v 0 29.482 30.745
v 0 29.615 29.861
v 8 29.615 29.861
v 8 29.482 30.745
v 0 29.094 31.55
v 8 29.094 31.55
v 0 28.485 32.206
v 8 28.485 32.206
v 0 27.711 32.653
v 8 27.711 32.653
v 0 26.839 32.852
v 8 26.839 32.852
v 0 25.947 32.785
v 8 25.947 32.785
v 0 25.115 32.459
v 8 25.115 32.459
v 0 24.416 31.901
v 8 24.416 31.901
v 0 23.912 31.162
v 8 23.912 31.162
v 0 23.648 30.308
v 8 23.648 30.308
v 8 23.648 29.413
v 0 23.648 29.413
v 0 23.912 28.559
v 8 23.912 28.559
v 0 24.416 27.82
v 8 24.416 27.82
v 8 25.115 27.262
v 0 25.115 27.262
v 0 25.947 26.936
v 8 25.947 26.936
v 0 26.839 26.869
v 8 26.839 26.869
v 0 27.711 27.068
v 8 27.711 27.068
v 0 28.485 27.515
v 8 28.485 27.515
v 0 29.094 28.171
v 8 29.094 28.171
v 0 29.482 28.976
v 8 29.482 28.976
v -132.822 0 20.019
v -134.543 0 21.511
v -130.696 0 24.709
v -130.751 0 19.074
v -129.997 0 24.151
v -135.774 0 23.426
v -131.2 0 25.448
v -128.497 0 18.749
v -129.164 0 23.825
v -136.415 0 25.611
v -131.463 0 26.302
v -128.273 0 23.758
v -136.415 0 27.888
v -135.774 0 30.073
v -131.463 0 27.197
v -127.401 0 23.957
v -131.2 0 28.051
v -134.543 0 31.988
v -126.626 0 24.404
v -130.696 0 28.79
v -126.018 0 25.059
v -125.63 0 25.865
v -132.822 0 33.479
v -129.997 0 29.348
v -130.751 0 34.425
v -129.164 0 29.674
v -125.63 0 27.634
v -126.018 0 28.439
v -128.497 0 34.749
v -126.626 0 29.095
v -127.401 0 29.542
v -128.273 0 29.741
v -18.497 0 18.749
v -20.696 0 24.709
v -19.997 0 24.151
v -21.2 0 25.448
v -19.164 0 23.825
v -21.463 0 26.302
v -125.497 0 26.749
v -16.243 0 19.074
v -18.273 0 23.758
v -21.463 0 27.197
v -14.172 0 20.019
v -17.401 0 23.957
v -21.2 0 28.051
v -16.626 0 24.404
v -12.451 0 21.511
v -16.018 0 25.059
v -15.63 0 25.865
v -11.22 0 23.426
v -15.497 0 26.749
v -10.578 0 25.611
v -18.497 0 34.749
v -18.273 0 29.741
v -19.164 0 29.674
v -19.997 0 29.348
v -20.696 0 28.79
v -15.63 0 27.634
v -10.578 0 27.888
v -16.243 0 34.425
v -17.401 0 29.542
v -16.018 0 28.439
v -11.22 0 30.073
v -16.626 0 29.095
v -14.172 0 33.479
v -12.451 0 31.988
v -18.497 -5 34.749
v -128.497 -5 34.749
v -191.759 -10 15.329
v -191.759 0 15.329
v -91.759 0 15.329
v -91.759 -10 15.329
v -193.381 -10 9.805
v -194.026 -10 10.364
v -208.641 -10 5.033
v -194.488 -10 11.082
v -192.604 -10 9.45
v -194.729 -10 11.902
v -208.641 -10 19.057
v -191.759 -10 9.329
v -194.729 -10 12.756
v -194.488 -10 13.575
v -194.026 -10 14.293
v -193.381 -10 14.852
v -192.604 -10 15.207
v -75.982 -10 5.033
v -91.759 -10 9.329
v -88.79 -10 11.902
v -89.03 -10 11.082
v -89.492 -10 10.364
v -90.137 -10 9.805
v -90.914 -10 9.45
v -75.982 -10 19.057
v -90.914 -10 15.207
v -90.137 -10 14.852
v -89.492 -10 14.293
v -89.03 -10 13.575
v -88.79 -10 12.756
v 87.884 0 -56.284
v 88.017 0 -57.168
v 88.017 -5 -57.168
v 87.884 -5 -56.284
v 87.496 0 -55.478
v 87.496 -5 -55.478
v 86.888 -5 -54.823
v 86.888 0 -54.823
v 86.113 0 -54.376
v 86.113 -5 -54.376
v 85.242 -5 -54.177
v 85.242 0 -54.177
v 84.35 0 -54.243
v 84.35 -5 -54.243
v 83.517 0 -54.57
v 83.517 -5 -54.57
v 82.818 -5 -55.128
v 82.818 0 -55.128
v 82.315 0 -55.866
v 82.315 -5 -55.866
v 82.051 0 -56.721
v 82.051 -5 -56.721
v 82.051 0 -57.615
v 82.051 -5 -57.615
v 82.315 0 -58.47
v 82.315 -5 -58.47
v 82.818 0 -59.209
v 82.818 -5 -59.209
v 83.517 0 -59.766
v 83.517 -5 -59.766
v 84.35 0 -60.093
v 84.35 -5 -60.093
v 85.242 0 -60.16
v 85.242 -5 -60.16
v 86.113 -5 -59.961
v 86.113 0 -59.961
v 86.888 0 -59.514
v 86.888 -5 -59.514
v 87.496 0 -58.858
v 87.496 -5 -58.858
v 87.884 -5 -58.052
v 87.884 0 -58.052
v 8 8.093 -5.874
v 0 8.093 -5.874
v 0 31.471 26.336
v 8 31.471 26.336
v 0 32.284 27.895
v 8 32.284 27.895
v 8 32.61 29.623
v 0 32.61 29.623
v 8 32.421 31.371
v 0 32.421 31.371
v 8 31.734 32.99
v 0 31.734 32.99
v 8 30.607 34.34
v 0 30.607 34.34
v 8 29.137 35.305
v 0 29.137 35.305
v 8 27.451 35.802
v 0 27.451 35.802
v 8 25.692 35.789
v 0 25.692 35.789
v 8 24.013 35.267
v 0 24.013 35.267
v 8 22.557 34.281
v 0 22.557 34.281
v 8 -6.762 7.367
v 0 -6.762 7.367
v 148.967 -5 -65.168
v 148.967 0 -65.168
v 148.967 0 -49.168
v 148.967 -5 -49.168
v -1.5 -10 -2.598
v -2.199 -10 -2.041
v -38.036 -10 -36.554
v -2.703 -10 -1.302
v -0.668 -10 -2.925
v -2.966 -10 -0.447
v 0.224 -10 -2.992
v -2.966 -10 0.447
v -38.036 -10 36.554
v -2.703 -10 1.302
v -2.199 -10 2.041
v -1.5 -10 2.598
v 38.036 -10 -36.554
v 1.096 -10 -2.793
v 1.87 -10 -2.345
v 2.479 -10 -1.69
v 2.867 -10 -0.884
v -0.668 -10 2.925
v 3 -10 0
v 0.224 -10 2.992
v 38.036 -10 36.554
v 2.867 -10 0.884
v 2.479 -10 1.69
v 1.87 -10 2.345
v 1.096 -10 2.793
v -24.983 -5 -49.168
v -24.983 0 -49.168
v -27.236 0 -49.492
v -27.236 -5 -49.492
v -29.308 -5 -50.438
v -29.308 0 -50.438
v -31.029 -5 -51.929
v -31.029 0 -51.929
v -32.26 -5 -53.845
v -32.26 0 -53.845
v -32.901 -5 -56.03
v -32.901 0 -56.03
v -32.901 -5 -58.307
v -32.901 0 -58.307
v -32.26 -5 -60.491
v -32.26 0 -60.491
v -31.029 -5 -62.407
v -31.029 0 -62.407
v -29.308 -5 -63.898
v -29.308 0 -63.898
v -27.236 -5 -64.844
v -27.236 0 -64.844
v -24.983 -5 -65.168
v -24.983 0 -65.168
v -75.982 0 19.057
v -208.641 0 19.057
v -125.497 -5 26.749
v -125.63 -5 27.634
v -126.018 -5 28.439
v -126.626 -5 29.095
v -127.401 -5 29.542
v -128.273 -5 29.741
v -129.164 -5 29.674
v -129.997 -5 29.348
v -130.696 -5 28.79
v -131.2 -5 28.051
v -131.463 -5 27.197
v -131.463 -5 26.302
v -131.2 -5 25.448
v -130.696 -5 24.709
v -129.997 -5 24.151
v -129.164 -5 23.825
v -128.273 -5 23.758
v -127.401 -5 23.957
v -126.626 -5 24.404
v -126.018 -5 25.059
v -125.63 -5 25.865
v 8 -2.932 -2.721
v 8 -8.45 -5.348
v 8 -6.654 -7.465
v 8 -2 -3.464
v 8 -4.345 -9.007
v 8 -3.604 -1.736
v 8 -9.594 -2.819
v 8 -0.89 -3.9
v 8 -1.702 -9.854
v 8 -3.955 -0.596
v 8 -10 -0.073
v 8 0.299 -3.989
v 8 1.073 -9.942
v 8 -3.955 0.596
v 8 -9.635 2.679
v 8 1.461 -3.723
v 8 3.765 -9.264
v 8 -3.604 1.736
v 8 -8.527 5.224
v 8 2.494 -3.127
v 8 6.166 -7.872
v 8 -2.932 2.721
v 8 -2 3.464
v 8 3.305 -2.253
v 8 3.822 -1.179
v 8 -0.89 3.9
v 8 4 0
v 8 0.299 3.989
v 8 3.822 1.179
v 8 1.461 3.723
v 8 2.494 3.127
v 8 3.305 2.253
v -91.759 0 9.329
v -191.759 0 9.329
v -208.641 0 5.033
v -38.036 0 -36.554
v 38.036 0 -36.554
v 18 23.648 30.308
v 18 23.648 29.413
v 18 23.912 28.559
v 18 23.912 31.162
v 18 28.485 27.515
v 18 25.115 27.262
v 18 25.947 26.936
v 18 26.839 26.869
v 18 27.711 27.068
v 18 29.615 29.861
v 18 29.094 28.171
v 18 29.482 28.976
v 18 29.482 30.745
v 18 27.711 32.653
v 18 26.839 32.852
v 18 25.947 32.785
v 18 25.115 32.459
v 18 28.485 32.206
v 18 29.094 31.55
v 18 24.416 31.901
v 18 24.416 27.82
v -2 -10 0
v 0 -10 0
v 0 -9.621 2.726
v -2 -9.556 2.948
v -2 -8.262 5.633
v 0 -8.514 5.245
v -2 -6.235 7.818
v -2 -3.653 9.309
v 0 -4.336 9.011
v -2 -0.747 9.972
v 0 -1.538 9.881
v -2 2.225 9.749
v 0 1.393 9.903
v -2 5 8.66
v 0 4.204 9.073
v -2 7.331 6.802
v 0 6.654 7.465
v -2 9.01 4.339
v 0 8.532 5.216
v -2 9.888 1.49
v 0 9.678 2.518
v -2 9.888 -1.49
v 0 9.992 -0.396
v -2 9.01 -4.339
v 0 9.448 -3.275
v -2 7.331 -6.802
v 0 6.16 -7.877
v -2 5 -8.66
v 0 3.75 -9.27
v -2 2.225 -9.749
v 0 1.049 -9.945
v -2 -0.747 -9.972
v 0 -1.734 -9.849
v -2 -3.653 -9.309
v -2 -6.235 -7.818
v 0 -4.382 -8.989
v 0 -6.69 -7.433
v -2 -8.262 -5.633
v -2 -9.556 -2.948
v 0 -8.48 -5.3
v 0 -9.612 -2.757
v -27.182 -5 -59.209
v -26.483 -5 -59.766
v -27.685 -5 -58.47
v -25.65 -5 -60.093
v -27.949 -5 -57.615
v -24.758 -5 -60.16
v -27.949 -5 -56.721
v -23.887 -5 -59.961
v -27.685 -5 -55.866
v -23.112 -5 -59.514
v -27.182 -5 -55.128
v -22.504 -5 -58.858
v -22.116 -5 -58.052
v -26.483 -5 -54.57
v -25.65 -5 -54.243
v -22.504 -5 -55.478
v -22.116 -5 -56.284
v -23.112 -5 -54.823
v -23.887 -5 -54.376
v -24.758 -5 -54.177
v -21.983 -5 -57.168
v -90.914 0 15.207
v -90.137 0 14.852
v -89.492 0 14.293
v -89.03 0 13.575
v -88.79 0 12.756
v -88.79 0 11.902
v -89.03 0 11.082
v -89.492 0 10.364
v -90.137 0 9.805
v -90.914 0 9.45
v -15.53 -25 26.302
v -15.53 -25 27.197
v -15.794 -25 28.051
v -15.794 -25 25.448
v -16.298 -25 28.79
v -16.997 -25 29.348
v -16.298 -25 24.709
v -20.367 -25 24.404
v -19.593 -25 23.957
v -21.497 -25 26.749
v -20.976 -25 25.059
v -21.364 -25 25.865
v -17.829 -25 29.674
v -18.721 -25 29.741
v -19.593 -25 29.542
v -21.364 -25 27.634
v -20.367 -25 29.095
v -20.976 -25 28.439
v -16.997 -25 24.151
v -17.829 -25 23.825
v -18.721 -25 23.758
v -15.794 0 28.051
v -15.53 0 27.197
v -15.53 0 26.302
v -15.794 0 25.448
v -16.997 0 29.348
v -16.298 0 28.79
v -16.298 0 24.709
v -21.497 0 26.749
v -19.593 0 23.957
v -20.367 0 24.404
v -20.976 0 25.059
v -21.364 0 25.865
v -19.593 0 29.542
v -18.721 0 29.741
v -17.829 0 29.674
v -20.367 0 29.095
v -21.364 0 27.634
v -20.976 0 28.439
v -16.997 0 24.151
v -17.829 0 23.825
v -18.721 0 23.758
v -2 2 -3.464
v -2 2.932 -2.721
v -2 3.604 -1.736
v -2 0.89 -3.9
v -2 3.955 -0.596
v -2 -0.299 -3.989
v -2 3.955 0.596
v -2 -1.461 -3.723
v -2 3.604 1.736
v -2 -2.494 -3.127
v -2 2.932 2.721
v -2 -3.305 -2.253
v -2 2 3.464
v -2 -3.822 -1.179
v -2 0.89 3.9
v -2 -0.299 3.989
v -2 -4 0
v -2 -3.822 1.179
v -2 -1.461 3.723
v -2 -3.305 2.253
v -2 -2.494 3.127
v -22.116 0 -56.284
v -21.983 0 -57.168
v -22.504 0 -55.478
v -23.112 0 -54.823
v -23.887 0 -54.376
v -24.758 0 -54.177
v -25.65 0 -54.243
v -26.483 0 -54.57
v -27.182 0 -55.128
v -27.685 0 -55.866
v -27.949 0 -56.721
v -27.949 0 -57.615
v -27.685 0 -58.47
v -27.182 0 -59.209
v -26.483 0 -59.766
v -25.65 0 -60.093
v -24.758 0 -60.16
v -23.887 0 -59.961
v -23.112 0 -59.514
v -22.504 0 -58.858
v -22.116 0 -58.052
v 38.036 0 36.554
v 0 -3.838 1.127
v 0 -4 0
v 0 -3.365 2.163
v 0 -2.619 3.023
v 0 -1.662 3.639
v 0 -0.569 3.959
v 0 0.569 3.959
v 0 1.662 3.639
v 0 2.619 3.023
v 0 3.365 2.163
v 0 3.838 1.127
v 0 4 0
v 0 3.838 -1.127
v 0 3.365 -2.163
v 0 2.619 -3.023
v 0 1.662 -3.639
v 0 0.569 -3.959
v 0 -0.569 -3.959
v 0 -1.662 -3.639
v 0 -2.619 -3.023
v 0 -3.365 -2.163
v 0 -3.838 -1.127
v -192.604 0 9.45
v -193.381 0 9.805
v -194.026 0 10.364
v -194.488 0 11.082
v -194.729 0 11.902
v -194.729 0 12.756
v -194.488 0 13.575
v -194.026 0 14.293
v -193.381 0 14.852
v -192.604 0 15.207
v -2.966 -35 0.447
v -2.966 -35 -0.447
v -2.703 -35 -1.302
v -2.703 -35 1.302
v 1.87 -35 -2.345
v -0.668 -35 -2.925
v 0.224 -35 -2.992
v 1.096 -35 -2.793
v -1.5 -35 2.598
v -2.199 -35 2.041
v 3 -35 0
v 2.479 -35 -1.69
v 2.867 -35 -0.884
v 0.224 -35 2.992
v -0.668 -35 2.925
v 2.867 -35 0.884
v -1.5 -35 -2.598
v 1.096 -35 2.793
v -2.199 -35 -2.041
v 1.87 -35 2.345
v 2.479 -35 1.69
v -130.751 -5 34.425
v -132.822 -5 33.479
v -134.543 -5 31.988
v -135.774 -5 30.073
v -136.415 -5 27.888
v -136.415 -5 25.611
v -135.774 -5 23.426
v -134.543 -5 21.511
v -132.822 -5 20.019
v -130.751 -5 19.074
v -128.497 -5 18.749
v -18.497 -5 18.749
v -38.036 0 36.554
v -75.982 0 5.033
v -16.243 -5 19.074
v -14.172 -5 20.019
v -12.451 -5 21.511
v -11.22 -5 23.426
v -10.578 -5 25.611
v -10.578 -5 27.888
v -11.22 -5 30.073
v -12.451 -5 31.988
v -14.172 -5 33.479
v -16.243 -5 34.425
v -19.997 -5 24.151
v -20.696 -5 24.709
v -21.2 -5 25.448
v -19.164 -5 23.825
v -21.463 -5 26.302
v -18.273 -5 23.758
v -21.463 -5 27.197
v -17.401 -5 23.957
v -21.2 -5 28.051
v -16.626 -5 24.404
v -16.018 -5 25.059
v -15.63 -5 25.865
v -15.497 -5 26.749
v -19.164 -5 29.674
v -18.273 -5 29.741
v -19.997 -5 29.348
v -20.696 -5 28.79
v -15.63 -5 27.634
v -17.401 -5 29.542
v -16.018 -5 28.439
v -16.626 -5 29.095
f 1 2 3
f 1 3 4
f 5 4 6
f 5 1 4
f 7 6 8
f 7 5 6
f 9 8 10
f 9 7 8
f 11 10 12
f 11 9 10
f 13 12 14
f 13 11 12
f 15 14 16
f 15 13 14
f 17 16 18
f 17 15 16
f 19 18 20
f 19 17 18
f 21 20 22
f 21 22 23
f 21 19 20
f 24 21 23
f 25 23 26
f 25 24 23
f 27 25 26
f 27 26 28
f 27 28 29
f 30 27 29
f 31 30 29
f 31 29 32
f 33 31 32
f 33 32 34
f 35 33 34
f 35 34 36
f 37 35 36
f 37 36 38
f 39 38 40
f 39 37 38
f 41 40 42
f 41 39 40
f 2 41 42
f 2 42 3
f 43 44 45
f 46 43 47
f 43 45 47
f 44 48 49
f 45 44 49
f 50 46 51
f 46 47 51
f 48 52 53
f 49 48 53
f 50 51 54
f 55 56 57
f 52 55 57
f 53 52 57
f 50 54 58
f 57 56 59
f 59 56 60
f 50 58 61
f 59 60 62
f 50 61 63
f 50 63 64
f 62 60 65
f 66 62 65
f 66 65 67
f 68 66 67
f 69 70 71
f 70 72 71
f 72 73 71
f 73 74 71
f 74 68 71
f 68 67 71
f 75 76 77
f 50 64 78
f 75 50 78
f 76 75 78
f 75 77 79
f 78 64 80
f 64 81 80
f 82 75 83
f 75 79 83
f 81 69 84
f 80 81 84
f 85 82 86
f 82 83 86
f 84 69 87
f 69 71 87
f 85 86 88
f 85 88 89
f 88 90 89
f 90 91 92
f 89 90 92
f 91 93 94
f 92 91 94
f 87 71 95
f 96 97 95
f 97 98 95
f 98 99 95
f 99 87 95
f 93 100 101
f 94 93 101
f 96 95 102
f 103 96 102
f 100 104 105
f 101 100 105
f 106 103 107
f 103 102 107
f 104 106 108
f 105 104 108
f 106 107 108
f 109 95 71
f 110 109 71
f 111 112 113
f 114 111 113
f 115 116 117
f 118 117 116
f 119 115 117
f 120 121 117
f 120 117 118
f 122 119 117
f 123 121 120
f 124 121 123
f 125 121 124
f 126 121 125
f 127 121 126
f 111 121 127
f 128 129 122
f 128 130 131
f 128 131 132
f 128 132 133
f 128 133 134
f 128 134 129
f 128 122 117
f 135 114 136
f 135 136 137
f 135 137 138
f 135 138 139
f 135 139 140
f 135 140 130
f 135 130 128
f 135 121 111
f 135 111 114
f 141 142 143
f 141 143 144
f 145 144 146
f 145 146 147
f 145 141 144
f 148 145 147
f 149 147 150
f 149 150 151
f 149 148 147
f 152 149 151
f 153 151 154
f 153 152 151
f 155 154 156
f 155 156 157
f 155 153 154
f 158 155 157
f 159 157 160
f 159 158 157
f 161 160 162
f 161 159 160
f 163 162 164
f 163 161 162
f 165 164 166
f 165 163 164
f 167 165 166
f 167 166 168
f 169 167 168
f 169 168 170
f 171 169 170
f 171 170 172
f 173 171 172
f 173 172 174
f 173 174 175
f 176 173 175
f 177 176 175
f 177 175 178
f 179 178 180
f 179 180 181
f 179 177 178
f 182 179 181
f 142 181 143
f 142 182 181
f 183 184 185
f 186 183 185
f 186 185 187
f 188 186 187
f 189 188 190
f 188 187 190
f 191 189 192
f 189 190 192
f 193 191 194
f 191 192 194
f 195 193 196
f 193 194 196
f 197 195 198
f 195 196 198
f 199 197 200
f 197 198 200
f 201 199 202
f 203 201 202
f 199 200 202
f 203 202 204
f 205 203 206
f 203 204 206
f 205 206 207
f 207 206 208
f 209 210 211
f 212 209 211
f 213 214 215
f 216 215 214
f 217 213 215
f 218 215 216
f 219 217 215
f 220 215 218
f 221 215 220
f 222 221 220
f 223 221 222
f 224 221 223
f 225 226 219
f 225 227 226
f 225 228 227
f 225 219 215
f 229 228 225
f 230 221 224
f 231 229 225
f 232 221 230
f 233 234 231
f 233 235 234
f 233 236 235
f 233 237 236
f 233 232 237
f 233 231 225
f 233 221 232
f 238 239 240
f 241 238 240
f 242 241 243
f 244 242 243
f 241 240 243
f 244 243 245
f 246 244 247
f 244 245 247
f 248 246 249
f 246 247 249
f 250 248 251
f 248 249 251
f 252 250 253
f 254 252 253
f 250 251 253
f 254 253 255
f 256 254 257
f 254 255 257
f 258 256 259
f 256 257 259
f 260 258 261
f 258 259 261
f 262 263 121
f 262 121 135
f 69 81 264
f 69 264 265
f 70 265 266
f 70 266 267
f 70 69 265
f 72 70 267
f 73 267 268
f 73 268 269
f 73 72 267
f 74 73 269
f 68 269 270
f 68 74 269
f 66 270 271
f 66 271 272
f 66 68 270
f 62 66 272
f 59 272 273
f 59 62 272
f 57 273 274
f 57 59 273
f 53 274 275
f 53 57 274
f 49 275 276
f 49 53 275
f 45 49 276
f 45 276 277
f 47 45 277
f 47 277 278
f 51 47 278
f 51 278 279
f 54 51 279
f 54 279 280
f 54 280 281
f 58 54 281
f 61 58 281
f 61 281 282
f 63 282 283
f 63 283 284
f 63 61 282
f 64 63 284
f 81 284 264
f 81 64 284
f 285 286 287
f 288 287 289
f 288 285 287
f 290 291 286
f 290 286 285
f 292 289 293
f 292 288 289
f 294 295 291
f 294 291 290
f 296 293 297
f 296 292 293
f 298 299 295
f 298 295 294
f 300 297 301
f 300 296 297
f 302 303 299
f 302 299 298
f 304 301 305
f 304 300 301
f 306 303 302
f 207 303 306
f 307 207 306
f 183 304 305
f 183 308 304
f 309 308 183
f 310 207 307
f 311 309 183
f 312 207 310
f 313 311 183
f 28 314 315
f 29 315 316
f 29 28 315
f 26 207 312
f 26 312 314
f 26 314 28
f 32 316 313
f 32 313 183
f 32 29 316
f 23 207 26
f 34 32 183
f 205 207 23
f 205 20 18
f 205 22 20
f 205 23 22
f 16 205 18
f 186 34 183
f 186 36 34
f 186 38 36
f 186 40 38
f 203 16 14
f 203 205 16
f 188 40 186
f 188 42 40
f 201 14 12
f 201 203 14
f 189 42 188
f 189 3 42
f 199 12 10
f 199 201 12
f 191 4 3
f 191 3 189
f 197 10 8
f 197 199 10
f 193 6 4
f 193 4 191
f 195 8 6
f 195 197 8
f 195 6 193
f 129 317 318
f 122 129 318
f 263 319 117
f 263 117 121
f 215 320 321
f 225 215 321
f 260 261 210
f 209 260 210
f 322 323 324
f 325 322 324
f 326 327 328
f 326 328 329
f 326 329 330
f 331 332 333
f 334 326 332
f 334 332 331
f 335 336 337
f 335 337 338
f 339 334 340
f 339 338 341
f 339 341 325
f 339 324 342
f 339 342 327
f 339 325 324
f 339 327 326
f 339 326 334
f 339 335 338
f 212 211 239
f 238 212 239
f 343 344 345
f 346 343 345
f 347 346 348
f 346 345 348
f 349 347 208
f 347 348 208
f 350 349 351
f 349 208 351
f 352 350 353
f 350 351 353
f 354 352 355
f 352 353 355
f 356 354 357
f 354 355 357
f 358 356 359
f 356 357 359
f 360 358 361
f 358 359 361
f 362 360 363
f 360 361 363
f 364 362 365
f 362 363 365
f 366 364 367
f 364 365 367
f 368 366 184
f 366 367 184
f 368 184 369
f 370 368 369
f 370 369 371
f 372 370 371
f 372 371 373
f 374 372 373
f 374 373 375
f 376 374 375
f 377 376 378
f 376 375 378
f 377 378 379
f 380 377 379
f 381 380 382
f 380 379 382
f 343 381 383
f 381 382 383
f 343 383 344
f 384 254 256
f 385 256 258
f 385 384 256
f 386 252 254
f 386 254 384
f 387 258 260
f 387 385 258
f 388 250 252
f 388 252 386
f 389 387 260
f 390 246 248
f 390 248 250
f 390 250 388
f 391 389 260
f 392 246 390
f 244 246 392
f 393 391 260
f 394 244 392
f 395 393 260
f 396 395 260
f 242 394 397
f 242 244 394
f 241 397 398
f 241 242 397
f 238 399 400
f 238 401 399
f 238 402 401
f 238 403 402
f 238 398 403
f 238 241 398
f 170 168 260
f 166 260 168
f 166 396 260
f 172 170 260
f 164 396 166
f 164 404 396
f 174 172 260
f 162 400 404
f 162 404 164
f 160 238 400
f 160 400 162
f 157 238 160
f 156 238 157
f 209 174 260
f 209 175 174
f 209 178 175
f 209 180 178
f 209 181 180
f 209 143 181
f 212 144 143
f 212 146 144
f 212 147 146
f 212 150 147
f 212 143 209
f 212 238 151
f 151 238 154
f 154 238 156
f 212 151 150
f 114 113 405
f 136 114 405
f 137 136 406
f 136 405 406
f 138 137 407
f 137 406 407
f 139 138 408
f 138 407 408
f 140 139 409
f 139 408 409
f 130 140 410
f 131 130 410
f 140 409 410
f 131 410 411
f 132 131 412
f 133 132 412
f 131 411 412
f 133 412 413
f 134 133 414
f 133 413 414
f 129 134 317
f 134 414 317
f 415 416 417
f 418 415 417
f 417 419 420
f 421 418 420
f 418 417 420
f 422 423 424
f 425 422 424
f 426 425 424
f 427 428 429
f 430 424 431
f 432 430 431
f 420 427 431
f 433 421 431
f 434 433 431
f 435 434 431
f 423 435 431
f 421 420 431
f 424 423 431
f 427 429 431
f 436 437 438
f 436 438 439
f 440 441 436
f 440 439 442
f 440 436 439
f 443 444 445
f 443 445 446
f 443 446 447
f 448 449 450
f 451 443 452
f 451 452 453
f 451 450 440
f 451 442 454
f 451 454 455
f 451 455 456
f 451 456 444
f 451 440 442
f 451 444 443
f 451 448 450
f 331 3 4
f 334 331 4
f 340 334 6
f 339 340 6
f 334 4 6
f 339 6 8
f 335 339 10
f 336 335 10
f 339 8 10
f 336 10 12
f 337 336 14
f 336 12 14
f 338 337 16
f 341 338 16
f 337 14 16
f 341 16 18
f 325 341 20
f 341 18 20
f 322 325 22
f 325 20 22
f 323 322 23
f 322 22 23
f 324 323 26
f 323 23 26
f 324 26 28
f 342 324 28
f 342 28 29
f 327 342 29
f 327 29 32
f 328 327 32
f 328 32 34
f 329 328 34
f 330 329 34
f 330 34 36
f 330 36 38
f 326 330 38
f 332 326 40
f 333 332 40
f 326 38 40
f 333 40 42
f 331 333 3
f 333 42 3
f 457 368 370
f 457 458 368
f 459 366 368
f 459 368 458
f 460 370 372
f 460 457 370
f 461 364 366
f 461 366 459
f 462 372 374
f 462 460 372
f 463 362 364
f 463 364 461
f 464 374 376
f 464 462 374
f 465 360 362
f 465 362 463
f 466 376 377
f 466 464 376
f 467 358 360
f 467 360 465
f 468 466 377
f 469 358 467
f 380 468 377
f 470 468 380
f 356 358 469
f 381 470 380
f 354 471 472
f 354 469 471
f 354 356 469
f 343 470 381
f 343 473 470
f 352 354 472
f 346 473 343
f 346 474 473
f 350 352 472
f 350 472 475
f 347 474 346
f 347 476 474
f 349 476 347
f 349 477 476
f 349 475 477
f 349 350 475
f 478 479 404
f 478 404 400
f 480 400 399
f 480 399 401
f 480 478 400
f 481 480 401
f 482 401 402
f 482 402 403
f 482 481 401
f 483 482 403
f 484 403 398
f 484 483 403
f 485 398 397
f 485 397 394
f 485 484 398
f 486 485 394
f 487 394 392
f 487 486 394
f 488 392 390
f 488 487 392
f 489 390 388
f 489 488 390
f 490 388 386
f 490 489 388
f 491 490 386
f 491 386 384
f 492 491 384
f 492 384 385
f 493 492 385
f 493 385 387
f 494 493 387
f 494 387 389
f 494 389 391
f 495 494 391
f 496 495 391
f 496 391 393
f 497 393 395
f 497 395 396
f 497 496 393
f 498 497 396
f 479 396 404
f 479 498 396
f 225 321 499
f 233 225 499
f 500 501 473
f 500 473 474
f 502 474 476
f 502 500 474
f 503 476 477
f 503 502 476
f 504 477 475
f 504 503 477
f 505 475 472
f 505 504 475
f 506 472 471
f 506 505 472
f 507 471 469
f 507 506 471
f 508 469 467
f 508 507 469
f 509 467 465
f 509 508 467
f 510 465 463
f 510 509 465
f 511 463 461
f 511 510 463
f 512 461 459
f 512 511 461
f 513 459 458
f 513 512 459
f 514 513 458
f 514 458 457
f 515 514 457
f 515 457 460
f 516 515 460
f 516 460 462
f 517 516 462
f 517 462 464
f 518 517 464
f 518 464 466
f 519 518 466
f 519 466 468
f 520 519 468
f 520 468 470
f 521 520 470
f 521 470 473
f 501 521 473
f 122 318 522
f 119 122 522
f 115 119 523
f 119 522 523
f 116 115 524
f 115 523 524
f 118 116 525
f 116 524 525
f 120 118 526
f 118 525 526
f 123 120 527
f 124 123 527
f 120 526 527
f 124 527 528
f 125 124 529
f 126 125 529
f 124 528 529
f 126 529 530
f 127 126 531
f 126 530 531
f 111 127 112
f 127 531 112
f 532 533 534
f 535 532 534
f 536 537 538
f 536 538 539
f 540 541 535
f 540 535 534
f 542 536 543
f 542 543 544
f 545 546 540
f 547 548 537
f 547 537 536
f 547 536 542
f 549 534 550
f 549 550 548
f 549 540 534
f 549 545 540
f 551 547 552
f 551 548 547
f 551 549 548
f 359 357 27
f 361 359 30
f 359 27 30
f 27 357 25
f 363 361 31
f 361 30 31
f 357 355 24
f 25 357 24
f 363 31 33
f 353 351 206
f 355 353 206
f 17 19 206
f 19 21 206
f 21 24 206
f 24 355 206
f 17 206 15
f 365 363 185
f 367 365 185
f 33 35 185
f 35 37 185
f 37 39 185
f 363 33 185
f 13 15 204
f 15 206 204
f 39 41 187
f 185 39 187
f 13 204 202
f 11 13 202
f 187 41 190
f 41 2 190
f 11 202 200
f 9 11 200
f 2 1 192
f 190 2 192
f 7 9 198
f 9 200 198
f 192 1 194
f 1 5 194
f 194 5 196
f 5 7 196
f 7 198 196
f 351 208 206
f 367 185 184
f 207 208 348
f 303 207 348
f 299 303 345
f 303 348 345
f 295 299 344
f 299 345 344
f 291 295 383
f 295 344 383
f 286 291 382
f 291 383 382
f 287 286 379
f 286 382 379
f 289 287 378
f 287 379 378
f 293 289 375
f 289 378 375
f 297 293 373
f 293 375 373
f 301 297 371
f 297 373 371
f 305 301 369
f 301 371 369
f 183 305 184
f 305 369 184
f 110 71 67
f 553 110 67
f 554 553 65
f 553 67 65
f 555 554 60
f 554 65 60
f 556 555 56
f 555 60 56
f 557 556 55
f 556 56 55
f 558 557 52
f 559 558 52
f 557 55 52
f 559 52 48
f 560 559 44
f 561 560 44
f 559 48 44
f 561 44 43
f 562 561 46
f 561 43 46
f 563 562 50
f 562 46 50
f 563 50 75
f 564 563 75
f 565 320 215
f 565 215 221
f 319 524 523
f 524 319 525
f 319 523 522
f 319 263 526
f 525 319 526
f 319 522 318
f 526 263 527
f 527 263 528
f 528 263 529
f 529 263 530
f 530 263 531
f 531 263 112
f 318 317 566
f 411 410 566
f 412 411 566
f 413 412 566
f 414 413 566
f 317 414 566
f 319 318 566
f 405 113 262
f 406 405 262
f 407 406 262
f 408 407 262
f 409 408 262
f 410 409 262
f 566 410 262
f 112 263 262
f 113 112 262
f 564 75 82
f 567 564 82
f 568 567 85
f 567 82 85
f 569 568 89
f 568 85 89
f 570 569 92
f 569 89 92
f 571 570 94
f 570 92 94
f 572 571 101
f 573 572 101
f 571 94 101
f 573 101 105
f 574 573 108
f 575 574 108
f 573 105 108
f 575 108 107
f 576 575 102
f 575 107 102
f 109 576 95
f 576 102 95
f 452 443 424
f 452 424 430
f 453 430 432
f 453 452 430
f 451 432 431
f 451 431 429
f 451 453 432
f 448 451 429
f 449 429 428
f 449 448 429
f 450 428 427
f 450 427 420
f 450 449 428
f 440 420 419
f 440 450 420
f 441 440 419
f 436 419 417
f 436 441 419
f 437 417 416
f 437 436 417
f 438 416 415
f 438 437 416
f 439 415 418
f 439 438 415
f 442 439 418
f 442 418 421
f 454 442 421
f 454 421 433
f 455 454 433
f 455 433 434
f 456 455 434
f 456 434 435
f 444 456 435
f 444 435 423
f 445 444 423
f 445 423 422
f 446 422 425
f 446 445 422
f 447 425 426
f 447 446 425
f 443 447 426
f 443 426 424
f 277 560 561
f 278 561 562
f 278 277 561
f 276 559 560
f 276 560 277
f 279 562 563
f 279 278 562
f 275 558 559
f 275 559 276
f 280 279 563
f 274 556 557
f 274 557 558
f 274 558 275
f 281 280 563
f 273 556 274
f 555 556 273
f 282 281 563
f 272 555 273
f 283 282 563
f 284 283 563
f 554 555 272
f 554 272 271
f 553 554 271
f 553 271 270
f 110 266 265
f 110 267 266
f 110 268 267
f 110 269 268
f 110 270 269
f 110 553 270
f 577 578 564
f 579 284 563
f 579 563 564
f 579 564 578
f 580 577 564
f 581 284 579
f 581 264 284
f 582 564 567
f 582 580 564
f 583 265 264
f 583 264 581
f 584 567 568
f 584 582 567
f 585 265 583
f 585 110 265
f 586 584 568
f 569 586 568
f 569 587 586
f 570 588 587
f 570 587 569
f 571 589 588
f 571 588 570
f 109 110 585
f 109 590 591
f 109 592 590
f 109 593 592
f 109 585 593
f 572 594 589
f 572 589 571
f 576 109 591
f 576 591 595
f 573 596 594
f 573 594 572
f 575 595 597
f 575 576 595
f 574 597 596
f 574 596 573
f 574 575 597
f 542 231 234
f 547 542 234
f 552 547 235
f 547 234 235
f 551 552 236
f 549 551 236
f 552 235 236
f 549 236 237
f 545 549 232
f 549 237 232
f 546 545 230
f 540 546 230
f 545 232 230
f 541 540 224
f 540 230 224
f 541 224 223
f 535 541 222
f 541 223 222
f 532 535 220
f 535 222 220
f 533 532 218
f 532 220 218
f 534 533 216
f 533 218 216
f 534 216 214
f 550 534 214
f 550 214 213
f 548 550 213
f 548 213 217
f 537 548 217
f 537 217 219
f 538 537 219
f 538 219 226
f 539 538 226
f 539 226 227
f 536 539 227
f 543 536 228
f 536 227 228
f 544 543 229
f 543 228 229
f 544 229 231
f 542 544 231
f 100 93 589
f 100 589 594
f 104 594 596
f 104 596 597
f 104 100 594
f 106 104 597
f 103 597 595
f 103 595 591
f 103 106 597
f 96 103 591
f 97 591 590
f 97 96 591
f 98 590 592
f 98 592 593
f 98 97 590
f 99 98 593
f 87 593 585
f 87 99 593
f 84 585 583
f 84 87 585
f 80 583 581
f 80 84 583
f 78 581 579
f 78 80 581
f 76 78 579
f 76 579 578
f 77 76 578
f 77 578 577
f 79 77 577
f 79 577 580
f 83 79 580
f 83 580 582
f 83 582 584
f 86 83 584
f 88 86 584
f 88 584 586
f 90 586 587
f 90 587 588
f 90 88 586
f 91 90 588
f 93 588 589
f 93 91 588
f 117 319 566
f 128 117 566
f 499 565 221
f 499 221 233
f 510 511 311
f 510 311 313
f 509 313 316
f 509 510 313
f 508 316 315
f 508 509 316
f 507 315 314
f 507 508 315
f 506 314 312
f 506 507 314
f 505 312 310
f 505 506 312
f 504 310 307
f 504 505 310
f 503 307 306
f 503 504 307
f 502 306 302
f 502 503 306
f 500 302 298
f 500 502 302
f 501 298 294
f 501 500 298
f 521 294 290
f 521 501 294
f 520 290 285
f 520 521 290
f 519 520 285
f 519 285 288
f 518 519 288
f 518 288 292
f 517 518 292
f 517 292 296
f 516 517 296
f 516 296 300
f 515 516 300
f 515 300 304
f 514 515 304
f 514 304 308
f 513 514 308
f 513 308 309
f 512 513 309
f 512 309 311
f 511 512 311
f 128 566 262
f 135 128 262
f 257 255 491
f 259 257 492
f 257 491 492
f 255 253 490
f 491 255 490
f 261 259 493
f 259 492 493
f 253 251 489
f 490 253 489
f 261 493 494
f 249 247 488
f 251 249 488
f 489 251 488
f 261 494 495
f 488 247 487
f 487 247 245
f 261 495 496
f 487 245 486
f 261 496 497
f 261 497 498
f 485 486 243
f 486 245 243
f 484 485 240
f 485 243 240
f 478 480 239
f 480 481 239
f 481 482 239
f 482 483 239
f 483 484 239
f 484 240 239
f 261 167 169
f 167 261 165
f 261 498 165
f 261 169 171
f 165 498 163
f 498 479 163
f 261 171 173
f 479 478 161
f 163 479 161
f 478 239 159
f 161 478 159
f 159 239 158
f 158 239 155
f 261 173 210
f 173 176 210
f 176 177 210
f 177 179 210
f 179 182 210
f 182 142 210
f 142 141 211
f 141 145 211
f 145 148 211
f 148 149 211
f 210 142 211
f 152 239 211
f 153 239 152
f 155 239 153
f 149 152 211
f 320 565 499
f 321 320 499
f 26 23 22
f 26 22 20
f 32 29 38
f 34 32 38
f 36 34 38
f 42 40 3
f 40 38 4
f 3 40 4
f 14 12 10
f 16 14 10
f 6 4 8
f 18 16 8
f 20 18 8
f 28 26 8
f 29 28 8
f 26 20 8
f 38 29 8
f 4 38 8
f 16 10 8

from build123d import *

# Parameters (mm, degrees)
F0_W      = 76.0718137026
F0_H      = 73.10795784
F1_DEPTH  = 10
F2_R      = 3
F3_DEPTH  = 25
F4_R      = 3
F5_DEPTH  = 5
F6_R      = 4
F6_R_2    = 3
F7_DEPTH  = 8
F8_R      = 10
F8_R_2    = 4
F9_DEPTH  = 2
F10_R     = 3
F11_DEPTH = 25
F12_W     = 132.6596662402
F12_H     = 14.0240215696
F13_DEPTH = 10
F14_R     = 3
F15_DEPTH = 10
F18_R     = 3
F19_DEPTH = 5


with BuildPart() as f1:
    # F0 (on Front) → F1 (new body)
    with BuildSketch(Plane.XZ):
        Rectangle(F0_W, F0_H)
    extrude(amount=F1_DEPTH)

    # F2 (on face) → F3 (join)
    with BuildSketch(Plane.XZ.offset(10)):
        Circle(F2_R)
    extrude(amount=F3_DEPTH)


with BuildPart() as f5:
    # F4 (on Front) → F5 (new body)
    with BuildSketch(Plane.XZ):
        with BuildLine():
            Line((-18.4969218779, 34.7494600266), (-128.4969218779, 34.7494600266))
            ThreePointArc((-128.4969218779, 34.7494600266), (-136.4969218779, 26.7494600266), (-128.4969218779, 18.7494600266))
            Line((-128.4969218779, 18.7494600266), (-18.4969218779, 18.7494600266))
            ThreePointArc((-18.4969218779, 18.7494600266), (-10.4969218779, 26.7494600266), (-18.4969218779, 34.7494600266))
        make_face()
        with Locations((-128.4969218779, 26.7494600266)):
            Circle(F4_R, mode=Mode.SUBTRACT)
        with Locations((-18.4969218779, 26.7494600266)):
            Circle(F4_R, mode=Mode.SUBTRACT)
    extrude(amount=F5_DEPTH)


with BuildPart() as f7:
    # F6 (on Right) → F7 (new body)
    with BuildSketch(Plane.YZ):
        with BuildLine():
            Line((22.5574149312, 34.2806509801), (-6.7623428333, 7.3668663219))
            ThreePointArc((-6.7623428333, 7.3668663219), (-6.6537051578, -7.4651327967), (8.0930838649, -5.8738397626))
            Line((8.0930838649, -5.8738397626), (31.4706709501, 26.3362273294))
            ThreePointArc((31.4706709501, 26.3362273294), (30.6070437259, 34.339610865), (22.5574149312, 34.2806509801))
        make_face()
        Circle(F6_R, mode=Mode.SUBTRACT)
        with Locations((26.6148206312, 29.860531187)):
            Circle(F6_R_2, mode=Mode.SUBTRACT)
    extrude(amount=F7_DEPTH)

    # F8 (on face) → F9 (join)
    with BuildSketch(Plane(origin=(0, 0, 0), x_dir=(0, -1, 0), z_dir=(-1, 0, 0))):
        Circle(F8_R)
        Circle(F8_R_2, mode=Mode.SUBTRACT)
    extrude(amount=F9_DEPTH)


with BuildPart() as f11:
    # F10 (on face) → F11 (new body)
    with BuildSketch(Plane(origin=(0, 0, 0), x_dir=(-1, 0, 0), z_dir=(0, 1, 0))):
        with Locations((18.4969218779, 26.7494600266)):
            Circle(F10_R)
    extrude(amount=-F11_DEPTH)


with BuildPart() as f13:
    # F12 (on Front) → F13 (new body)
    with BuildSketch(Plane.XZ):
        with Locations((-142.3116214573, 12.0453021955)):
            Rectangle(F12_W, F12_H)
        with BuildLine():
            ThreePointArc((-191.759181451, 9.3285967857), (-194.759181451, 12.3285967857), (-191.759181451, 15.3285967857))
            Line((-191.759181451, 15.3285967857), (-91.759181451, 15.3285967857))
            ThreePointArc((-91.759181451, 15.3285967857), (-88.759181451, 12.3285967857), (-91.759181451, 9.3285967857))
            Line((-91.759181451, 9.3285967857), (-191.759181451, 9.3285967857))
        make_face(mode=Mode.SUBTRACT)
    extrude(amount=F13_DEPTH)


with BuildPart() as f15:
    # F14 (on face) → F15 (new body)
    with BuildSketch(Plane.YZ.offset(8)):
        with Locations((26.6148206312, 29.860531187)):
            Circle(F14_R)
    extrude(amount=F15_DEPTH)


with BuildPart() as f16_1:
    # F16: copy of F5
    add(f5.part.moved(Location((0, -77, 0))))


with BuildPart() as f19:
    # F18 (on Front) → F19 (new body)
    with BuildSketch(Plane.XZ):
        with BuildLine():
            Line((148.9666812122, -49.1681344882), (-24.9825420976, -49.1681344882))
            ThreePointArc((-24.9825420976, -49.1681344882), (-32.9825420976, -57.1681344882), (-24.9825420976, -65.1681344882))
            Line((-24.9825420976, -65.1681344882), (148.9666812122, -65.1681344882))
            Line((148.9666812122, -65.1681344882), (148.9666812122, -49.1681344882))
        make_face()
        with Locations((-24.9825420976, -57.1681344882)):
            Circle(F18_R, mode=Mode.SUBTRACT)
        with Locations((85.0174579024, -57.1681344882)):
            Circle(F18_R, mode=Mode.SUBTRACT)
    extrude(amount=F19_DEPTH)


solid = Compound([f1.part, f5.part, f7.part, f11.part, f13.part, f15.part, f19.part])
